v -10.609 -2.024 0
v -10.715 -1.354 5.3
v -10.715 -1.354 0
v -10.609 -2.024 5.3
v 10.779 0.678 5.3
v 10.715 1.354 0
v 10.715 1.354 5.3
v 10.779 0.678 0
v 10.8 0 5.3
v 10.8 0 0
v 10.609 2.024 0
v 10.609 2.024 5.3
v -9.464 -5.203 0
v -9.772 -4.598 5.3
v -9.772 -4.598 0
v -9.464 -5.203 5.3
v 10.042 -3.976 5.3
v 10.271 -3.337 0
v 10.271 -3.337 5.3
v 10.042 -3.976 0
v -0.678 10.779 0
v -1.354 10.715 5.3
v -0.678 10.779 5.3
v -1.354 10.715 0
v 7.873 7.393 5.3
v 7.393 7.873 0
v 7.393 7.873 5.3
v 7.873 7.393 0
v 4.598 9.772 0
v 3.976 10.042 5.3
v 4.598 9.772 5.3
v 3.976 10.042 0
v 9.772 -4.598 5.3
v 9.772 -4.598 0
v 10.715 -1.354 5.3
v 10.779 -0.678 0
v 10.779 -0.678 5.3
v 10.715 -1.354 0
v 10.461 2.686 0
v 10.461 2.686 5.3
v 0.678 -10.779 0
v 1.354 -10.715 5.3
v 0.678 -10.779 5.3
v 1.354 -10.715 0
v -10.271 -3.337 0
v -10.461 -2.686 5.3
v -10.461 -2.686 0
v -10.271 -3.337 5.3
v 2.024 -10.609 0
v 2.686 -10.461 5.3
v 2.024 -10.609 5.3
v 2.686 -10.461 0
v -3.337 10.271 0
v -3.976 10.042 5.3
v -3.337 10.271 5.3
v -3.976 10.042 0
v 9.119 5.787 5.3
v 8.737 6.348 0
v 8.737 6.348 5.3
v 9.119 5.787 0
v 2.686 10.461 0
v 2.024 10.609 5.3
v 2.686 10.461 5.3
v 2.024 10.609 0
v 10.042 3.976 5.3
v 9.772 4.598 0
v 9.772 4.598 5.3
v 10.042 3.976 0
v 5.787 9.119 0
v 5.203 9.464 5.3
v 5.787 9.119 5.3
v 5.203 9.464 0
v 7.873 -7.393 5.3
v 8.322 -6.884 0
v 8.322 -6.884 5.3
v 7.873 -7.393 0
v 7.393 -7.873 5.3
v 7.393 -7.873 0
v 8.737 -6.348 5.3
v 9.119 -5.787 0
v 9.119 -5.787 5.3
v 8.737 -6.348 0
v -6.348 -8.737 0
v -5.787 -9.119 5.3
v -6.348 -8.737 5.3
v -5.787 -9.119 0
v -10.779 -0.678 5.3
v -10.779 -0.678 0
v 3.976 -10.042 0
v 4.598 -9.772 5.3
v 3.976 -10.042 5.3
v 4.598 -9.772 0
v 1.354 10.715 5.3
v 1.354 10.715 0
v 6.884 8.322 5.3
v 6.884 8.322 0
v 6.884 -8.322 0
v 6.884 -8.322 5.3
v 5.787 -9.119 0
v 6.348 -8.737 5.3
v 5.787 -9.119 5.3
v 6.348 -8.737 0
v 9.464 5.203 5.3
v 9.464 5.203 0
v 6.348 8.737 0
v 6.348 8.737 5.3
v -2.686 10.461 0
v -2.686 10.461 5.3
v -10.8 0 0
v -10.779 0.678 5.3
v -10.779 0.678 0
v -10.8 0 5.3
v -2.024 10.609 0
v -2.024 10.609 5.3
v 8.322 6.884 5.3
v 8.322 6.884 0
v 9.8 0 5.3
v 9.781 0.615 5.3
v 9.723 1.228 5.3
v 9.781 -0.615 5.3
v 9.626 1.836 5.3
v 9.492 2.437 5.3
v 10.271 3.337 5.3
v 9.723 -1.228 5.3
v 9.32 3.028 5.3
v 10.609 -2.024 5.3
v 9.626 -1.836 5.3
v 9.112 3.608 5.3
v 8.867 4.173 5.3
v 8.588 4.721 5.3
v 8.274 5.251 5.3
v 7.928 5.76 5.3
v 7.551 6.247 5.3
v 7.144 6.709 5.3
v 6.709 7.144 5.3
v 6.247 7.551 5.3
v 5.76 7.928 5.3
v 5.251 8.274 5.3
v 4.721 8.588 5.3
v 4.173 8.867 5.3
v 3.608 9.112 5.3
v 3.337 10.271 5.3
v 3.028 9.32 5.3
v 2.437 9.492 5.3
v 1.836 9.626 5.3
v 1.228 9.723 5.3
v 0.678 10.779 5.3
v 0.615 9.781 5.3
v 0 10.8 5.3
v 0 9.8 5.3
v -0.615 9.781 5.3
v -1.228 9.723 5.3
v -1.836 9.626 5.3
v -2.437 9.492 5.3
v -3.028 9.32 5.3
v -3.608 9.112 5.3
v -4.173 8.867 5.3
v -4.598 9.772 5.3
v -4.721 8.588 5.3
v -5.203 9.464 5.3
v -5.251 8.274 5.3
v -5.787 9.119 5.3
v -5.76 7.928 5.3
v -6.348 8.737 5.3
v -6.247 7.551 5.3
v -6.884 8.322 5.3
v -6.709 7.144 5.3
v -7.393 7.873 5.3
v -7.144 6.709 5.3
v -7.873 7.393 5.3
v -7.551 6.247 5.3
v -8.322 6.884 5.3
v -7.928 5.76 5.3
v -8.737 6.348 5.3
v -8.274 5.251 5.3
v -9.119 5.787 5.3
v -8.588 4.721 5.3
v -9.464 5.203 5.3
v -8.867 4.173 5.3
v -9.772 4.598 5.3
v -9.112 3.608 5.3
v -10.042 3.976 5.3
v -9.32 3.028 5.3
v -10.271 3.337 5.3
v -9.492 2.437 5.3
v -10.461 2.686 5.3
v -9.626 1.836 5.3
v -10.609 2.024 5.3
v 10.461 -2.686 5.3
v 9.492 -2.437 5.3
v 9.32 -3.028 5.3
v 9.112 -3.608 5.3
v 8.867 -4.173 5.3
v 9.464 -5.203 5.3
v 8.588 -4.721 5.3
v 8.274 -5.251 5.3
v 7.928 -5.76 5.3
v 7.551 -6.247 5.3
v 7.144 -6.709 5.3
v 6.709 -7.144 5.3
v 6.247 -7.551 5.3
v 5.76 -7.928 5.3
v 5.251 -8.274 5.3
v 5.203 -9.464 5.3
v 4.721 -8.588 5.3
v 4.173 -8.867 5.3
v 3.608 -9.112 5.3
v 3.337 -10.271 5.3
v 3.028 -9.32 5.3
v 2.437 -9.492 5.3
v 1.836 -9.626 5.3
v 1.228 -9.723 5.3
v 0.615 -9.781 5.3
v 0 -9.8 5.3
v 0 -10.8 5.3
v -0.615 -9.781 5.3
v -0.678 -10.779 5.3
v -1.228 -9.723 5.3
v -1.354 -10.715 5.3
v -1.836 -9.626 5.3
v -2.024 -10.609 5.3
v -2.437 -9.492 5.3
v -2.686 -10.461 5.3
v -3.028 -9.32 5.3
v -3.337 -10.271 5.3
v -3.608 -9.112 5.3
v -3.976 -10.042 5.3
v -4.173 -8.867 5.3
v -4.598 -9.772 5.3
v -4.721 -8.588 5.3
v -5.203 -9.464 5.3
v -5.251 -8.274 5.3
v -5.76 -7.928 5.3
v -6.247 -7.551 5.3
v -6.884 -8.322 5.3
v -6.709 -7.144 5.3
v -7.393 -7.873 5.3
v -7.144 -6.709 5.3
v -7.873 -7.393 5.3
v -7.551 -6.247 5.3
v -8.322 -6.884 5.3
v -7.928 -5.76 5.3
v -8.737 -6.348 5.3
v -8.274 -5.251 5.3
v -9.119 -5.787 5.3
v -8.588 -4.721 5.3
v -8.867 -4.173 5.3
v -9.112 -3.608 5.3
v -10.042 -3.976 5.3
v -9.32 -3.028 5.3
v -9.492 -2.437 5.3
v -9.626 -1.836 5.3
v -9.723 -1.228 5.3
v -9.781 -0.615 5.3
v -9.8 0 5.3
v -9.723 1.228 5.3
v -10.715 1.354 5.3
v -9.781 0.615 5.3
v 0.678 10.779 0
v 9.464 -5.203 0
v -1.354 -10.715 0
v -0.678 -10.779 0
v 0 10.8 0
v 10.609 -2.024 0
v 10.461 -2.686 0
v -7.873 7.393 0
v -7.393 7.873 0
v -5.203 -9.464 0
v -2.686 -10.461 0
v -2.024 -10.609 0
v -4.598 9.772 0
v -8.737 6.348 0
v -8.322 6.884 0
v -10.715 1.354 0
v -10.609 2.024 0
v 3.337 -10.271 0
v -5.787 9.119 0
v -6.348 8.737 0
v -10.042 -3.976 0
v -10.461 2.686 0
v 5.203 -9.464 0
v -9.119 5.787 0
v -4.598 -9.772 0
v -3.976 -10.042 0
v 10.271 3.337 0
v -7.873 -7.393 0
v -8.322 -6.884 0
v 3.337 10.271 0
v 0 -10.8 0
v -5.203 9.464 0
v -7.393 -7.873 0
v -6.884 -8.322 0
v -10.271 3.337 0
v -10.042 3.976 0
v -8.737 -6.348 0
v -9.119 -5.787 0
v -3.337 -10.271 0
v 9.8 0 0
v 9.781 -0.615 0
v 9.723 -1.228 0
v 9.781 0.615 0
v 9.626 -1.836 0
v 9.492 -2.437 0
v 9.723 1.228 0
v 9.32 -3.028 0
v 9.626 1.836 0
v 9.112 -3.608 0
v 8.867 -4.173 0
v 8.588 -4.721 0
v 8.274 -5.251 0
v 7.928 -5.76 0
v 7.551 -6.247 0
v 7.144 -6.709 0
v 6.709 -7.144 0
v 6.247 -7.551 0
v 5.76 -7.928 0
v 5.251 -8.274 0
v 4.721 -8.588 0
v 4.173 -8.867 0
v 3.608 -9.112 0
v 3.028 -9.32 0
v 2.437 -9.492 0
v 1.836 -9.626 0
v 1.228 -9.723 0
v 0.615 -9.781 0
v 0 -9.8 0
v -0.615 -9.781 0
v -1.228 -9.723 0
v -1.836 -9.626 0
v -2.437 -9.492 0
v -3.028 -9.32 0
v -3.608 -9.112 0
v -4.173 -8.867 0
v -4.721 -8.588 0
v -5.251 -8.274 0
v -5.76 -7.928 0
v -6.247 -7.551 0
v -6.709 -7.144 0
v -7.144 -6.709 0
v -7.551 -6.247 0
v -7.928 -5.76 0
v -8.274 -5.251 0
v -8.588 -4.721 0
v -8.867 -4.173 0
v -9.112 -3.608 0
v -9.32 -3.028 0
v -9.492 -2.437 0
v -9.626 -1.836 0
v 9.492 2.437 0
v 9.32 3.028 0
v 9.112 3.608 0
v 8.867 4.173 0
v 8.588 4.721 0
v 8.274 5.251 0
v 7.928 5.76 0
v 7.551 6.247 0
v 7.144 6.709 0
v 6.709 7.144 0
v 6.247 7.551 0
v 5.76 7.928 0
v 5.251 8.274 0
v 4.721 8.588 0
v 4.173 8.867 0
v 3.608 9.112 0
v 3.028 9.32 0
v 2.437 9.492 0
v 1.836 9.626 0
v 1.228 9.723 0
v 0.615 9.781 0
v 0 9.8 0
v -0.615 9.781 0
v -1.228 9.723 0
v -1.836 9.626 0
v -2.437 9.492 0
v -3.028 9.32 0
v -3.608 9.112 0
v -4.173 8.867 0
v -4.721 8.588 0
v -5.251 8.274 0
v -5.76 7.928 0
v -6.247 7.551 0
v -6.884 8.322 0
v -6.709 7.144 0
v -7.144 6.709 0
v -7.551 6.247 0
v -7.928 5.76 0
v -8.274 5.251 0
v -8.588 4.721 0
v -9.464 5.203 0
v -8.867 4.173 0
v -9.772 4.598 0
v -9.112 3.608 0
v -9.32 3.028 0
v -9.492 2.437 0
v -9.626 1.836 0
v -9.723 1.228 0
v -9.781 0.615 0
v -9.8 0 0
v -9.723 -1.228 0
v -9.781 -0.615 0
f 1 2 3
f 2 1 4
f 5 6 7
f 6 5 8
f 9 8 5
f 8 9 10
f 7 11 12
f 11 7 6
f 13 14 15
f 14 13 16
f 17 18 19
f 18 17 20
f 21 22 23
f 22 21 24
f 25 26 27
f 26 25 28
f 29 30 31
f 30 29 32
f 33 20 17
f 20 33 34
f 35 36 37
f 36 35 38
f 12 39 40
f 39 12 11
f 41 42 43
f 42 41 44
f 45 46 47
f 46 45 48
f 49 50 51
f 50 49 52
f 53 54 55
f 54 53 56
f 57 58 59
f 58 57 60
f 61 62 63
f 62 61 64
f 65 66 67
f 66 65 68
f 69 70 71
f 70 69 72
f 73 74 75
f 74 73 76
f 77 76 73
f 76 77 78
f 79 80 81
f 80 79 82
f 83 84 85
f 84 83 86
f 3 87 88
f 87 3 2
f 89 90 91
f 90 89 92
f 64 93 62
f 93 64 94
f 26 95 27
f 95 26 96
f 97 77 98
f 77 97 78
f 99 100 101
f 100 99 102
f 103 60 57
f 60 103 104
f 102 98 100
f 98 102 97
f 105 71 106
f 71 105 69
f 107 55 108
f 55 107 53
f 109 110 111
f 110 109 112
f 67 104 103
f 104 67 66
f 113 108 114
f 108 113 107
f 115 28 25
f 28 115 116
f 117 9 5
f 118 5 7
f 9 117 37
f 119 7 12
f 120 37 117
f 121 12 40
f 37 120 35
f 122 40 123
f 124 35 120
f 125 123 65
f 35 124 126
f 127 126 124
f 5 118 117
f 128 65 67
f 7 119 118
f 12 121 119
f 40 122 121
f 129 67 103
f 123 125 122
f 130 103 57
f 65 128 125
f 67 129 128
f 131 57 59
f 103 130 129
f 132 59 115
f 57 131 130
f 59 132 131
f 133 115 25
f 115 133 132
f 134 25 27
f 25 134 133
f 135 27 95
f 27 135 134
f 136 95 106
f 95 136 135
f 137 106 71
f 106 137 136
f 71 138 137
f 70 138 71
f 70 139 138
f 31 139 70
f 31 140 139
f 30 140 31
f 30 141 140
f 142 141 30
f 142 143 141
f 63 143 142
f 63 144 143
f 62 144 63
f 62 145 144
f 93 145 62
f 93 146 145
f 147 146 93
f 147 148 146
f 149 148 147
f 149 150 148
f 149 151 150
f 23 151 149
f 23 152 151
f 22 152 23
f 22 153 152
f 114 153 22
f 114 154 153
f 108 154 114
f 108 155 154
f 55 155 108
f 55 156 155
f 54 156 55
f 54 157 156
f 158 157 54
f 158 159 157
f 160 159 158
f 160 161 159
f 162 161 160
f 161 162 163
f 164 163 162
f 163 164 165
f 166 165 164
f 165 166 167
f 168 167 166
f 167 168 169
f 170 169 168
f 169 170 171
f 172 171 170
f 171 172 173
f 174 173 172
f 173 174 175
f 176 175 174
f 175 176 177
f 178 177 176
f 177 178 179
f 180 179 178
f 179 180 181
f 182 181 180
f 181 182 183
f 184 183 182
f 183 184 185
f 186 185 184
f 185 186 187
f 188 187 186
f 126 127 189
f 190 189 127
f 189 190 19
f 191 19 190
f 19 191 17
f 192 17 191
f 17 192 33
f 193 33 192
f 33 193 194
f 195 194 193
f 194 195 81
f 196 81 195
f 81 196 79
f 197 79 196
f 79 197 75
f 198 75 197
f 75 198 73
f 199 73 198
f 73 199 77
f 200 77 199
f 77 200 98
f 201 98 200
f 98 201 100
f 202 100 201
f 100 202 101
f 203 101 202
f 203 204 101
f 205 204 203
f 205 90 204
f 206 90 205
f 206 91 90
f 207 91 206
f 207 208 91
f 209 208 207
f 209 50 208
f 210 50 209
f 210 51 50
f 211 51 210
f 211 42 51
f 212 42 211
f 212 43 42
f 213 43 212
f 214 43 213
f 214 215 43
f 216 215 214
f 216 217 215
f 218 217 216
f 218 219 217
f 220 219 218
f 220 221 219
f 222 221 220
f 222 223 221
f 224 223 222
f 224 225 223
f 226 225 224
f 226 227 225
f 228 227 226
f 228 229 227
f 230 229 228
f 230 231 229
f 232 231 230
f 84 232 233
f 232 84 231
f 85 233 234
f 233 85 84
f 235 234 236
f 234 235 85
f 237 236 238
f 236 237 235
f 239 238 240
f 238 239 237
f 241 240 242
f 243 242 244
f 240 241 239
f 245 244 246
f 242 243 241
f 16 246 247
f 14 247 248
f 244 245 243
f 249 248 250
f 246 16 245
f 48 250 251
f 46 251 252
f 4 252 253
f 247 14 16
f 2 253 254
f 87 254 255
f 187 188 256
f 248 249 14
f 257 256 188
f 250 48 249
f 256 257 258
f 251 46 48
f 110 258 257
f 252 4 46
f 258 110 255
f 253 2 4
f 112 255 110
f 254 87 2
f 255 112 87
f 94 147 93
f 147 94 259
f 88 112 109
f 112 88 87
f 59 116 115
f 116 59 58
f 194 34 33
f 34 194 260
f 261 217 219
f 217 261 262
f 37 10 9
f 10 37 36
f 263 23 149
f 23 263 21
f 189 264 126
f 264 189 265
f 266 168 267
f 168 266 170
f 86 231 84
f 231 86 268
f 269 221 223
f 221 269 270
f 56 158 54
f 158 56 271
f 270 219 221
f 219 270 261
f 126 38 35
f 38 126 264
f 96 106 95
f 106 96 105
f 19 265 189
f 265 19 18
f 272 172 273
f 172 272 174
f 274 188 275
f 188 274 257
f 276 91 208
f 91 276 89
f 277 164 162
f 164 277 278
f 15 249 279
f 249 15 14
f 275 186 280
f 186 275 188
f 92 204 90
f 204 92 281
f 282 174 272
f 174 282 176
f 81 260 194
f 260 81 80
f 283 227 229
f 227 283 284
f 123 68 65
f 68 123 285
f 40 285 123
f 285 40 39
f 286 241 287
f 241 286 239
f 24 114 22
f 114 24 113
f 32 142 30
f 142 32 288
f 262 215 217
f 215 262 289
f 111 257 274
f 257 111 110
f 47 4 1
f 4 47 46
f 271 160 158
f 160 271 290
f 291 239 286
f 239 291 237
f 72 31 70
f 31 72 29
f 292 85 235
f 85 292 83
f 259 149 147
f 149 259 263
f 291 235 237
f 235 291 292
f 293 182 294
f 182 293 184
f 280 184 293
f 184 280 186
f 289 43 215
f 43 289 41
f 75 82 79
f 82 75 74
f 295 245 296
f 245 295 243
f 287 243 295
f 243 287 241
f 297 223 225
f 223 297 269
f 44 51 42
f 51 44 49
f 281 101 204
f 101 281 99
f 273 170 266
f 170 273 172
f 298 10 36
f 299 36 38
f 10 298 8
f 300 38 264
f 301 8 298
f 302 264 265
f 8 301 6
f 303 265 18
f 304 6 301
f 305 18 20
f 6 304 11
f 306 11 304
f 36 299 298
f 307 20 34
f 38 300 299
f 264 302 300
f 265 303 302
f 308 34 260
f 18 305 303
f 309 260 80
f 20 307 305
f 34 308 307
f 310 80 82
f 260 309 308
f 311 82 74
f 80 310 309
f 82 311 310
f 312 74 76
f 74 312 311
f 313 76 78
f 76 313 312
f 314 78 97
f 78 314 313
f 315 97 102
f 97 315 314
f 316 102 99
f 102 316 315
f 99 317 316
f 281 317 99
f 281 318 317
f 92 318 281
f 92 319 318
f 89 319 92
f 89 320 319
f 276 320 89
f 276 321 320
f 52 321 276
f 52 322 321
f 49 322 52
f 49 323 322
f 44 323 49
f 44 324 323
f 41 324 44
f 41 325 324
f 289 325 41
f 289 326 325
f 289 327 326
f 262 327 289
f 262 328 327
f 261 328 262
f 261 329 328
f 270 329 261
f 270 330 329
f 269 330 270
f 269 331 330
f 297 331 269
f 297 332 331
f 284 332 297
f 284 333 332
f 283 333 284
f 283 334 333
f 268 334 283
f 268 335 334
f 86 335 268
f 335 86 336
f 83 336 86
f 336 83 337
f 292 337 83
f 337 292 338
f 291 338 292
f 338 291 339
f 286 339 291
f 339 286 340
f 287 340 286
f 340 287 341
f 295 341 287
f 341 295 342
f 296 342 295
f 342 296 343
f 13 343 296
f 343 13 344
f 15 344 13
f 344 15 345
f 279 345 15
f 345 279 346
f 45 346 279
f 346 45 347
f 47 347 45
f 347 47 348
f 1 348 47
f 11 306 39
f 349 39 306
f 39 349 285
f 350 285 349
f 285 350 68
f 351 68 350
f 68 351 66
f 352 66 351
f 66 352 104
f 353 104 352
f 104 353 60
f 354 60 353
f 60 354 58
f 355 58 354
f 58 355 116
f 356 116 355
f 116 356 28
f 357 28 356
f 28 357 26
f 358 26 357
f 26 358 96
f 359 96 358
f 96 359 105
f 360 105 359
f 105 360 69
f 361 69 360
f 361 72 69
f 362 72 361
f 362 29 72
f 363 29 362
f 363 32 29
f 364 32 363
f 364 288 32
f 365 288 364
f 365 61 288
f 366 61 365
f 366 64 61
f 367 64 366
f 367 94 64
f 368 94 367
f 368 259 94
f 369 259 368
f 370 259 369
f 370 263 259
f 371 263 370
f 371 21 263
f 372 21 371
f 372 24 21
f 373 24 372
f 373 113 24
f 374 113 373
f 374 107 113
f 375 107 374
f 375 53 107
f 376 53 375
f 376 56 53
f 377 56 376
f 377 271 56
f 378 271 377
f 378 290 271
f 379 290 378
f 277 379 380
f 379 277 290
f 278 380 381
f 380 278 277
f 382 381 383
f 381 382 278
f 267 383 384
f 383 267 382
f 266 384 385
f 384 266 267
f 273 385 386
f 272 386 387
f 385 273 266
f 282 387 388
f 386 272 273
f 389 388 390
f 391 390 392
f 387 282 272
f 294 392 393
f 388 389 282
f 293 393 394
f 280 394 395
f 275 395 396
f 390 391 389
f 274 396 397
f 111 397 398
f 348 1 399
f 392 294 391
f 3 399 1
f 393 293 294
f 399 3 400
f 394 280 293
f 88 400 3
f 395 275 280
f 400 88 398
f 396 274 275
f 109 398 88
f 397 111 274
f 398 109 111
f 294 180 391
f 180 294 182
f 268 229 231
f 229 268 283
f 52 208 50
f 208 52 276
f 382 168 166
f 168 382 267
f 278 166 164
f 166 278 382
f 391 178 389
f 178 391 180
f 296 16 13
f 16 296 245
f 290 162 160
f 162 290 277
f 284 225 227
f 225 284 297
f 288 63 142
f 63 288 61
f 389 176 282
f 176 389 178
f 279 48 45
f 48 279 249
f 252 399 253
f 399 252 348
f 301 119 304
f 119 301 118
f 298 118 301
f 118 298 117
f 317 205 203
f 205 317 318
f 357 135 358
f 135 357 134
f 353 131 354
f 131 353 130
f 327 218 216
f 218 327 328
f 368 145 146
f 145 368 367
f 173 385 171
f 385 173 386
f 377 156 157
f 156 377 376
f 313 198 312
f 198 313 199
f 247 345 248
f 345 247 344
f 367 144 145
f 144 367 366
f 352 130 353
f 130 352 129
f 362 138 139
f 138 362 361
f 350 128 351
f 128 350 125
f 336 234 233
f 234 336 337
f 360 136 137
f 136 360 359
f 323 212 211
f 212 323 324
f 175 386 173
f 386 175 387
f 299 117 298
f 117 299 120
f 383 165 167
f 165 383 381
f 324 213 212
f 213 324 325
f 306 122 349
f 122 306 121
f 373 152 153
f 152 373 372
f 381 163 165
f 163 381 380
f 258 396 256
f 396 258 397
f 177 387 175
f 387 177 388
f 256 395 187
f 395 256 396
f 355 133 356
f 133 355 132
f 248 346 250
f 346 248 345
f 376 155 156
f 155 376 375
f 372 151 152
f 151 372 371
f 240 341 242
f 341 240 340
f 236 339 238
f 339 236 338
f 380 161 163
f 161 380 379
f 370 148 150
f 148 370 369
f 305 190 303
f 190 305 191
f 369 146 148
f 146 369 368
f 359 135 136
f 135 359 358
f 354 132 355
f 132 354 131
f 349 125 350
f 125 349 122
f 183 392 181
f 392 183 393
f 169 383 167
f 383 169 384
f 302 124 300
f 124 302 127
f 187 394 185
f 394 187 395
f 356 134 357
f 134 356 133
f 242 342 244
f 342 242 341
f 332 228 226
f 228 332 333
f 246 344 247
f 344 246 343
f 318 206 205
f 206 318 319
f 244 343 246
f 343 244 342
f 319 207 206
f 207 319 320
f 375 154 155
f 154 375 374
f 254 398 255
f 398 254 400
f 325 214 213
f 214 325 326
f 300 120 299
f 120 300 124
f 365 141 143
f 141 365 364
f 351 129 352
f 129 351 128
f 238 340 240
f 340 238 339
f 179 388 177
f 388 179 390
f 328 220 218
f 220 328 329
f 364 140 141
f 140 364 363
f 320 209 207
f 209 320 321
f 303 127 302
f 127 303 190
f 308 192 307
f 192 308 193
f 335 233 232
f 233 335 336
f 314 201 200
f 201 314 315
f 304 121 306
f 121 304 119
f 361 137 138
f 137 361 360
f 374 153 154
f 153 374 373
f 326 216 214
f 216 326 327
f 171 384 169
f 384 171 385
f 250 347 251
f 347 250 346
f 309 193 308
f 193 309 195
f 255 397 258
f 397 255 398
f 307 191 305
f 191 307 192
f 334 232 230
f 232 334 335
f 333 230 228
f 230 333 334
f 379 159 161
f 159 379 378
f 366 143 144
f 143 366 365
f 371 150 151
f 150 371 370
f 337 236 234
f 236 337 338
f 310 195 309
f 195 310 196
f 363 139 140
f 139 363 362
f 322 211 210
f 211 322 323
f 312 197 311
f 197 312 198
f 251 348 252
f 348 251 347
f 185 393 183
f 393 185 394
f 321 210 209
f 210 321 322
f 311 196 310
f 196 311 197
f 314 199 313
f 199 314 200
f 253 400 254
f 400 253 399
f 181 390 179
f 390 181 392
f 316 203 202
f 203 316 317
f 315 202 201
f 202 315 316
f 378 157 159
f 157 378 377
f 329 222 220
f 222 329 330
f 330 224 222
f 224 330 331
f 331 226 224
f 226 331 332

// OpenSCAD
module radial_body(outer_radius=10.8, inner_radius=10.8-1, height=5.3) {
    difference() {
        cylinder(h=height, r=outer_radius, $fn=100);
        cylinder(h=height, r=inner_radius, $fn=100);
    }
}

radial_body();
